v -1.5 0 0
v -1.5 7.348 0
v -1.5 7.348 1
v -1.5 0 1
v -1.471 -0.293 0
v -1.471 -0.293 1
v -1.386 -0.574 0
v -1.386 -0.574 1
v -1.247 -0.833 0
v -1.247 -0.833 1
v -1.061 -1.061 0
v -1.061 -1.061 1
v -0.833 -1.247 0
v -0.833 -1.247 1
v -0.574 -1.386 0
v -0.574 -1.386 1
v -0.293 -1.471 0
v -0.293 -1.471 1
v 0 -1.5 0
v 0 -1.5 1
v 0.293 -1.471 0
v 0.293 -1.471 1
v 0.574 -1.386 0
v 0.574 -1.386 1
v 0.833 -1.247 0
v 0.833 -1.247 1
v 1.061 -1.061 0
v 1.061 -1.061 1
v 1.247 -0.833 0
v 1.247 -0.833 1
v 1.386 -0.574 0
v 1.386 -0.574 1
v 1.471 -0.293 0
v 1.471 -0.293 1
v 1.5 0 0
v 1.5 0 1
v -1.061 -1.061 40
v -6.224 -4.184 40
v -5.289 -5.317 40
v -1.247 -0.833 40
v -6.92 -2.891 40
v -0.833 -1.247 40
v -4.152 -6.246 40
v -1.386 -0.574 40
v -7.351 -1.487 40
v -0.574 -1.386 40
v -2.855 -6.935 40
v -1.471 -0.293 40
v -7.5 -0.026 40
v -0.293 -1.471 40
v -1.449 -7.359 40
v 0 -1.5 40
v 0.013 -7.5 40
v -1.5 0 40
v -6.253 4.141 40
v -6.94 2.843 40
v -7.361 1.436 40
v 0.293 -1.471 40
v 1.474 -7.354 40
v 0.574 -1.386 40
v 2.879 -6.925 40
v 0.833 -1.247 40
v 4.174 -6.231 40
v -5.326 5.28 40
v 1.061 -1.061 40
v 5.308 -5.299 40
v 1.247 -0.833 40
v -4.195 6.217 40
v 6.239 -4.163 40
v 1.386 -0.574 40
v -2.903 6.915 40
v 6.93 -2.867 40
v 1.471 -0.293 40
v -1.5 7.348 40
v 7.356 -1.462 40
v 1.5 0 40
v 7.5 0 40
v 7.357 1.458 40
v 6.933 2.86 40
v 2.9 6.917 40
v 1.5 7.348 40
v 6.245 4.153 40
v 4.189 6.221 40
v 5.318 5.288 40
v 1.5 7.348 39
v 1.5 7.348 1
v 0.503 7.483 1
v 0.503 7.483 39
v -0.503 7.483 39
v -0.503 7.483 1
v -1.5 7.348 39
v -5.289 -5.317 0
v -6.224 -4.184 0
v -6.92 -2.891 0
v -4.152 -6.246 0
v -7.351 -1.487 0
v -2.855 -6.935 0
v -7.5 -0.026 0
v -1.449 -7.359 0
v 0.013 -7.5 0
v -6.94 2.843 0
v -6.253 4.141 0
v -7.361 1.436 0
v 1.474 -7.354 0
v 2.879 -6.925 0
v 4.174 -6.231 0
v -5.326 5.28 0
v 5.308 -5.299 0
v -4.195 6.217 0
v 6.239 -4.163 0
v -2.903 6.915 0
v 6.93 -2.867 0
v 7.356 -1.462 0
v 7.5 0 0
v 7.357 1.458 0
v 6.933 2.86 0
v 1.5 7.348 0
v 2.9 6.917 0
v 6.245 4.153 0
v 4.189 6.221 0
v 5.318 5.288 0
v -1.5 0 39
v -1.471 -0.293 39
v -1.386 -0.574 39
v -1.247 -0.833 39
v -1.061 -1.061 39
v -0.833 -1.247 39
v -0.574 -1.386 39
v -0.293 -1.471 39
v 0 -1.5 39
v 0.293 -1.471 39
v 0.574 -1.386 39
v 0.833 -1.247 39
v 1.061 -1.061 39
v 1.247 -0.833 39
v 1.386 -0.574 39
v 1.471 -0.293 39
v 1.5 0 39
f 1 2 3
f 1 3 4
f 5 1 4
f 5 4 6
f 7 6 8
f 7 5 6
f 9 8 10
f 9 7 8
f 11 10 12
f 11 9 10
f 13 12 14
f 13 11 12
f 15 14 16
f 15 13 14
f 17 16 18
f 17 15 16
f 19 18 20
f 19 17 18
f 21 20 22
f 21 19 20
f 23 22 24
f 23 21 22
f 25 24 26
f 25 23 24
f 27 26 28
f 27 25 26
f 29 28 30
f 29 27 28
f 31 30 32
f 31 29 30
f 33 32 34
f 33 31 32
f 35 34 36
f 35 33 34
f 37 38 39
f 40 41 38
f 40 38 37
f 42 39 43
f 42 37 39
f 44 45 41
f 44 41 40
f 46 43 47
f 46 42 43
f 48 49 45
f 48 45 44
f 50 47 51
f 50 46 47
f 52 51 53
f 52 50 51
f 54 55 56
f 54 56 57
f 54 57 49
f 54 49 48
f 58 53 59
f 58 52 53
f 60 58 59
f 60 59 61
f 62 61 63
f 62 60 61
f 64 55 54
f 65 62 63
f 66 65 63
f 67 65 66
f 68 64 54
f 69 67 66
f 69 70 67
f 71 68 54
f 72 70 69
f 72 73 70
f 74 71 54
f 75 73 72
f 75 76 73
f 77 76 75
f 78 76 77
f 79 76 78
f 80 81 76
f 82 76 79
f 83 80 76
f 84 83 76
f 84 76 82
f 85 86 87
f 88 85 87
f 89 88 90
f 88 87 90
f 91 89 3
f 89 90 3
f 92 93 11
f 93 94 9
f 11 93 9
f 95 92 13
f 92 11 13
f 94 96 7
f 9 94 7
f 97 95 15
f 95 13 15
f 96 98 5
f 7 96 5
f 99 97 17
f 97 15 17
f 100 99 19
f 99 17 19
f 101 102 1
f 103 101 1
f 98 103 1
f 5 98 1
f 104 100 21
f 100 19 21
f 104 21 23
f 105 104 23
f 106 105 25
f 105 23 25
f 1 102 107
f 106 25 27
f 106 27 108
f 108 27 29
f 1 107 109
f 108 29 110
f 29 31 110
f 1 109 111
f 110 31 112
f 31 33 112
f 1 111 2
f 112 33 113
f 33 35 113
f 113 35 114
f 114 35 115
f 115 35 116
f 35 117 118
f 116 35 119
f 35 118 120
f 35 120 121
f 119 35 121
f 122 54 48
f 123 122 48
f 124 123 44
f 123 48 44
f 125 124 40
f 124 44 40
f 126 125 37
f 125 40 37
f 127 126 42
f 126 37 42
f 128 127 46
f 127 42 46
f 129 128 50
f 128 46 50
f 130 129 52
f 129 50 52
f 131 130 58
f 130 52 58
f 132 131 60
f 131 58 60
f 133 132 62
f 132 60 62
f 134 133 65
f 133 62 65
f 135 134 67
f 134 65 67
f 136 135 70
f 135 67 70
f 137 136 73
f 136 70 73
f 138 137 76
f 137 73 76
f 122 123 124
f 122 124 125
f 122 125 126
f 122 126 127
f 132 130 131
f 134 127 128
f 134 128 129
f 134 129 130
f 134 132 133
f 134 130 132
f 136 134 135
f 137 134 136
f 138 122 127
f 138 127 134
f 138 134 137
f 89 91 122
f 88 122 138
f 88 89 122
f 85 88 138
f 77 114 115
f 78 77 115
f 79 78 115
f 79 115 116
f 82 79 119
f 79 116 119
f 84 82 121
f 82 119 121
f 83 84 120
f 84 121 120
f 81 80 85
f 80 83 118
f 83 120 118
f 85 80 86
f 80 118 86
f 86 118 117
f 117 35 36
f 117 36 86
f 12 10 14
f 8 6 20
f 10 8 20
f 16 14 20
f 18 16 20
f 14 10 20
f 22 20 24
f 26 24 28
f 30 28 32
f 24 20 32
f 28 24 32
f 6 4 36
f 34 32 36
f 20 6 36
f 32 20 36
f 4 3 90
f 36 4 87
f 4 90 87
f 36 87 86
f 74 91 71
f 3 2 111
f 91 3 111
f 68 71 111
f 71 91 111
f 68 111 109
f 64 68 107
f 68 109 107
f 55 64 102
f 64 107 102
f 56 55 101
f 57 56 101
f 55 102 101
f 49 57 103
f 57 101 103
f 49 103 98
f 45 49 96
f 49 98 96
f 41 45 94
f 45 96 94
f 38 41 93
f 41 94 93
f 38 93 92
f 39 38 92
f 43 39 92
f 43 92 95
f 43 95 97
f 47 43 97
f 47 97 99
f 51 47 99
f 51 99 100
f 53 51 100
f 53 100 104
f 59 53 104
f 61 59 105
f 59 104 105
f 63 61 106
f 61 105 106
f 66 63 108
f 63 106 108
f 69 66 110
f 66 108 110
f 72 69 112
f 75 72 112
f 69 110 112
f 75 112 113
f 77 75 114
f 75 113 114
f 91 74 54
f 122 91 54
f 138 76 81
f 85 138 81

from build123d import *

# Parameters (mm, degrees)
F1_DEPTH = 40
F2_DEPTH = 1
F4_DEPTH = 1


with BuildPart() as f1:
    # F0 (on Top) → F1 (new body)
    with BuildSketch(Plane.XY):
        with BuildLine():
            ThreePointArc((-1.5, 7.3484692283), (-4.7434164903, -5.8094750193), (7.5, 0))
            ThreePointArc((7.5, 0), (5.8094750193, 4.7434164903), (1.5, 7.3484692283))
            Line((1.5, 7.3484692283), (1.5, 0))
            ThreePointArc((1.5, 0), (0, -1.5), (-1.5, 0))
            Line((-1.5, 0), (-1.5, 7.3484692283))
        make_face()
        with BuildLine():
            Line((1.5, 0), (1.5, 7.3484692283))
            ThreePointArc((1.5, 7.3484692283), (0, 7.5), (-1.5, 7.3484692283))
            Line((-1.5, 7.3484692283), (-1.5, 0))
            ThreePointArc((-1.5, 0), (0, -1.5), (1.5, 0))
        make_face()
    extrude(amount=F1_DEPTH)

    # F0 (on Top) → F2 (cut)
    with BuildSketch(Plane.XY):
        with BuildLine():
            Line((1.5, 0), (1.5, 7.3484692283))
            ThreePointArc((1.5, 7.3484692283), (0, 7.5), (-1.5, 7.3484692283))
            Line((-1.5, 7.3484692283), (-1.5, 0))
            ThreePointArc((-1.5, 0), (0, -1.5), (1.5, 0))
        make_face()
    extrude(amount=F2_DEPTH, mode=Mode.SUBTRACT)

    # F3 (on face) → F4 (cut)
    with BuildSketch(Plane.XY.offset(40)):
        with BuildLine():
            ThreePointArc((-1.5, 0), (0, -1.5), (1.5, 0))
            Line((1.5, 0), (1.5, 7.3484692283))
            ThreePointArc((1.5, 7.3484692283), (0, 7.5), (-1.5, 7.3484692283))
            Line((-1.5, 7.3484692283), (-1.5, 0))
        make_face()
    extrude(amount=-F4_DEPTH, mode=Mode.SUBTRACT)


solid = f1.part
